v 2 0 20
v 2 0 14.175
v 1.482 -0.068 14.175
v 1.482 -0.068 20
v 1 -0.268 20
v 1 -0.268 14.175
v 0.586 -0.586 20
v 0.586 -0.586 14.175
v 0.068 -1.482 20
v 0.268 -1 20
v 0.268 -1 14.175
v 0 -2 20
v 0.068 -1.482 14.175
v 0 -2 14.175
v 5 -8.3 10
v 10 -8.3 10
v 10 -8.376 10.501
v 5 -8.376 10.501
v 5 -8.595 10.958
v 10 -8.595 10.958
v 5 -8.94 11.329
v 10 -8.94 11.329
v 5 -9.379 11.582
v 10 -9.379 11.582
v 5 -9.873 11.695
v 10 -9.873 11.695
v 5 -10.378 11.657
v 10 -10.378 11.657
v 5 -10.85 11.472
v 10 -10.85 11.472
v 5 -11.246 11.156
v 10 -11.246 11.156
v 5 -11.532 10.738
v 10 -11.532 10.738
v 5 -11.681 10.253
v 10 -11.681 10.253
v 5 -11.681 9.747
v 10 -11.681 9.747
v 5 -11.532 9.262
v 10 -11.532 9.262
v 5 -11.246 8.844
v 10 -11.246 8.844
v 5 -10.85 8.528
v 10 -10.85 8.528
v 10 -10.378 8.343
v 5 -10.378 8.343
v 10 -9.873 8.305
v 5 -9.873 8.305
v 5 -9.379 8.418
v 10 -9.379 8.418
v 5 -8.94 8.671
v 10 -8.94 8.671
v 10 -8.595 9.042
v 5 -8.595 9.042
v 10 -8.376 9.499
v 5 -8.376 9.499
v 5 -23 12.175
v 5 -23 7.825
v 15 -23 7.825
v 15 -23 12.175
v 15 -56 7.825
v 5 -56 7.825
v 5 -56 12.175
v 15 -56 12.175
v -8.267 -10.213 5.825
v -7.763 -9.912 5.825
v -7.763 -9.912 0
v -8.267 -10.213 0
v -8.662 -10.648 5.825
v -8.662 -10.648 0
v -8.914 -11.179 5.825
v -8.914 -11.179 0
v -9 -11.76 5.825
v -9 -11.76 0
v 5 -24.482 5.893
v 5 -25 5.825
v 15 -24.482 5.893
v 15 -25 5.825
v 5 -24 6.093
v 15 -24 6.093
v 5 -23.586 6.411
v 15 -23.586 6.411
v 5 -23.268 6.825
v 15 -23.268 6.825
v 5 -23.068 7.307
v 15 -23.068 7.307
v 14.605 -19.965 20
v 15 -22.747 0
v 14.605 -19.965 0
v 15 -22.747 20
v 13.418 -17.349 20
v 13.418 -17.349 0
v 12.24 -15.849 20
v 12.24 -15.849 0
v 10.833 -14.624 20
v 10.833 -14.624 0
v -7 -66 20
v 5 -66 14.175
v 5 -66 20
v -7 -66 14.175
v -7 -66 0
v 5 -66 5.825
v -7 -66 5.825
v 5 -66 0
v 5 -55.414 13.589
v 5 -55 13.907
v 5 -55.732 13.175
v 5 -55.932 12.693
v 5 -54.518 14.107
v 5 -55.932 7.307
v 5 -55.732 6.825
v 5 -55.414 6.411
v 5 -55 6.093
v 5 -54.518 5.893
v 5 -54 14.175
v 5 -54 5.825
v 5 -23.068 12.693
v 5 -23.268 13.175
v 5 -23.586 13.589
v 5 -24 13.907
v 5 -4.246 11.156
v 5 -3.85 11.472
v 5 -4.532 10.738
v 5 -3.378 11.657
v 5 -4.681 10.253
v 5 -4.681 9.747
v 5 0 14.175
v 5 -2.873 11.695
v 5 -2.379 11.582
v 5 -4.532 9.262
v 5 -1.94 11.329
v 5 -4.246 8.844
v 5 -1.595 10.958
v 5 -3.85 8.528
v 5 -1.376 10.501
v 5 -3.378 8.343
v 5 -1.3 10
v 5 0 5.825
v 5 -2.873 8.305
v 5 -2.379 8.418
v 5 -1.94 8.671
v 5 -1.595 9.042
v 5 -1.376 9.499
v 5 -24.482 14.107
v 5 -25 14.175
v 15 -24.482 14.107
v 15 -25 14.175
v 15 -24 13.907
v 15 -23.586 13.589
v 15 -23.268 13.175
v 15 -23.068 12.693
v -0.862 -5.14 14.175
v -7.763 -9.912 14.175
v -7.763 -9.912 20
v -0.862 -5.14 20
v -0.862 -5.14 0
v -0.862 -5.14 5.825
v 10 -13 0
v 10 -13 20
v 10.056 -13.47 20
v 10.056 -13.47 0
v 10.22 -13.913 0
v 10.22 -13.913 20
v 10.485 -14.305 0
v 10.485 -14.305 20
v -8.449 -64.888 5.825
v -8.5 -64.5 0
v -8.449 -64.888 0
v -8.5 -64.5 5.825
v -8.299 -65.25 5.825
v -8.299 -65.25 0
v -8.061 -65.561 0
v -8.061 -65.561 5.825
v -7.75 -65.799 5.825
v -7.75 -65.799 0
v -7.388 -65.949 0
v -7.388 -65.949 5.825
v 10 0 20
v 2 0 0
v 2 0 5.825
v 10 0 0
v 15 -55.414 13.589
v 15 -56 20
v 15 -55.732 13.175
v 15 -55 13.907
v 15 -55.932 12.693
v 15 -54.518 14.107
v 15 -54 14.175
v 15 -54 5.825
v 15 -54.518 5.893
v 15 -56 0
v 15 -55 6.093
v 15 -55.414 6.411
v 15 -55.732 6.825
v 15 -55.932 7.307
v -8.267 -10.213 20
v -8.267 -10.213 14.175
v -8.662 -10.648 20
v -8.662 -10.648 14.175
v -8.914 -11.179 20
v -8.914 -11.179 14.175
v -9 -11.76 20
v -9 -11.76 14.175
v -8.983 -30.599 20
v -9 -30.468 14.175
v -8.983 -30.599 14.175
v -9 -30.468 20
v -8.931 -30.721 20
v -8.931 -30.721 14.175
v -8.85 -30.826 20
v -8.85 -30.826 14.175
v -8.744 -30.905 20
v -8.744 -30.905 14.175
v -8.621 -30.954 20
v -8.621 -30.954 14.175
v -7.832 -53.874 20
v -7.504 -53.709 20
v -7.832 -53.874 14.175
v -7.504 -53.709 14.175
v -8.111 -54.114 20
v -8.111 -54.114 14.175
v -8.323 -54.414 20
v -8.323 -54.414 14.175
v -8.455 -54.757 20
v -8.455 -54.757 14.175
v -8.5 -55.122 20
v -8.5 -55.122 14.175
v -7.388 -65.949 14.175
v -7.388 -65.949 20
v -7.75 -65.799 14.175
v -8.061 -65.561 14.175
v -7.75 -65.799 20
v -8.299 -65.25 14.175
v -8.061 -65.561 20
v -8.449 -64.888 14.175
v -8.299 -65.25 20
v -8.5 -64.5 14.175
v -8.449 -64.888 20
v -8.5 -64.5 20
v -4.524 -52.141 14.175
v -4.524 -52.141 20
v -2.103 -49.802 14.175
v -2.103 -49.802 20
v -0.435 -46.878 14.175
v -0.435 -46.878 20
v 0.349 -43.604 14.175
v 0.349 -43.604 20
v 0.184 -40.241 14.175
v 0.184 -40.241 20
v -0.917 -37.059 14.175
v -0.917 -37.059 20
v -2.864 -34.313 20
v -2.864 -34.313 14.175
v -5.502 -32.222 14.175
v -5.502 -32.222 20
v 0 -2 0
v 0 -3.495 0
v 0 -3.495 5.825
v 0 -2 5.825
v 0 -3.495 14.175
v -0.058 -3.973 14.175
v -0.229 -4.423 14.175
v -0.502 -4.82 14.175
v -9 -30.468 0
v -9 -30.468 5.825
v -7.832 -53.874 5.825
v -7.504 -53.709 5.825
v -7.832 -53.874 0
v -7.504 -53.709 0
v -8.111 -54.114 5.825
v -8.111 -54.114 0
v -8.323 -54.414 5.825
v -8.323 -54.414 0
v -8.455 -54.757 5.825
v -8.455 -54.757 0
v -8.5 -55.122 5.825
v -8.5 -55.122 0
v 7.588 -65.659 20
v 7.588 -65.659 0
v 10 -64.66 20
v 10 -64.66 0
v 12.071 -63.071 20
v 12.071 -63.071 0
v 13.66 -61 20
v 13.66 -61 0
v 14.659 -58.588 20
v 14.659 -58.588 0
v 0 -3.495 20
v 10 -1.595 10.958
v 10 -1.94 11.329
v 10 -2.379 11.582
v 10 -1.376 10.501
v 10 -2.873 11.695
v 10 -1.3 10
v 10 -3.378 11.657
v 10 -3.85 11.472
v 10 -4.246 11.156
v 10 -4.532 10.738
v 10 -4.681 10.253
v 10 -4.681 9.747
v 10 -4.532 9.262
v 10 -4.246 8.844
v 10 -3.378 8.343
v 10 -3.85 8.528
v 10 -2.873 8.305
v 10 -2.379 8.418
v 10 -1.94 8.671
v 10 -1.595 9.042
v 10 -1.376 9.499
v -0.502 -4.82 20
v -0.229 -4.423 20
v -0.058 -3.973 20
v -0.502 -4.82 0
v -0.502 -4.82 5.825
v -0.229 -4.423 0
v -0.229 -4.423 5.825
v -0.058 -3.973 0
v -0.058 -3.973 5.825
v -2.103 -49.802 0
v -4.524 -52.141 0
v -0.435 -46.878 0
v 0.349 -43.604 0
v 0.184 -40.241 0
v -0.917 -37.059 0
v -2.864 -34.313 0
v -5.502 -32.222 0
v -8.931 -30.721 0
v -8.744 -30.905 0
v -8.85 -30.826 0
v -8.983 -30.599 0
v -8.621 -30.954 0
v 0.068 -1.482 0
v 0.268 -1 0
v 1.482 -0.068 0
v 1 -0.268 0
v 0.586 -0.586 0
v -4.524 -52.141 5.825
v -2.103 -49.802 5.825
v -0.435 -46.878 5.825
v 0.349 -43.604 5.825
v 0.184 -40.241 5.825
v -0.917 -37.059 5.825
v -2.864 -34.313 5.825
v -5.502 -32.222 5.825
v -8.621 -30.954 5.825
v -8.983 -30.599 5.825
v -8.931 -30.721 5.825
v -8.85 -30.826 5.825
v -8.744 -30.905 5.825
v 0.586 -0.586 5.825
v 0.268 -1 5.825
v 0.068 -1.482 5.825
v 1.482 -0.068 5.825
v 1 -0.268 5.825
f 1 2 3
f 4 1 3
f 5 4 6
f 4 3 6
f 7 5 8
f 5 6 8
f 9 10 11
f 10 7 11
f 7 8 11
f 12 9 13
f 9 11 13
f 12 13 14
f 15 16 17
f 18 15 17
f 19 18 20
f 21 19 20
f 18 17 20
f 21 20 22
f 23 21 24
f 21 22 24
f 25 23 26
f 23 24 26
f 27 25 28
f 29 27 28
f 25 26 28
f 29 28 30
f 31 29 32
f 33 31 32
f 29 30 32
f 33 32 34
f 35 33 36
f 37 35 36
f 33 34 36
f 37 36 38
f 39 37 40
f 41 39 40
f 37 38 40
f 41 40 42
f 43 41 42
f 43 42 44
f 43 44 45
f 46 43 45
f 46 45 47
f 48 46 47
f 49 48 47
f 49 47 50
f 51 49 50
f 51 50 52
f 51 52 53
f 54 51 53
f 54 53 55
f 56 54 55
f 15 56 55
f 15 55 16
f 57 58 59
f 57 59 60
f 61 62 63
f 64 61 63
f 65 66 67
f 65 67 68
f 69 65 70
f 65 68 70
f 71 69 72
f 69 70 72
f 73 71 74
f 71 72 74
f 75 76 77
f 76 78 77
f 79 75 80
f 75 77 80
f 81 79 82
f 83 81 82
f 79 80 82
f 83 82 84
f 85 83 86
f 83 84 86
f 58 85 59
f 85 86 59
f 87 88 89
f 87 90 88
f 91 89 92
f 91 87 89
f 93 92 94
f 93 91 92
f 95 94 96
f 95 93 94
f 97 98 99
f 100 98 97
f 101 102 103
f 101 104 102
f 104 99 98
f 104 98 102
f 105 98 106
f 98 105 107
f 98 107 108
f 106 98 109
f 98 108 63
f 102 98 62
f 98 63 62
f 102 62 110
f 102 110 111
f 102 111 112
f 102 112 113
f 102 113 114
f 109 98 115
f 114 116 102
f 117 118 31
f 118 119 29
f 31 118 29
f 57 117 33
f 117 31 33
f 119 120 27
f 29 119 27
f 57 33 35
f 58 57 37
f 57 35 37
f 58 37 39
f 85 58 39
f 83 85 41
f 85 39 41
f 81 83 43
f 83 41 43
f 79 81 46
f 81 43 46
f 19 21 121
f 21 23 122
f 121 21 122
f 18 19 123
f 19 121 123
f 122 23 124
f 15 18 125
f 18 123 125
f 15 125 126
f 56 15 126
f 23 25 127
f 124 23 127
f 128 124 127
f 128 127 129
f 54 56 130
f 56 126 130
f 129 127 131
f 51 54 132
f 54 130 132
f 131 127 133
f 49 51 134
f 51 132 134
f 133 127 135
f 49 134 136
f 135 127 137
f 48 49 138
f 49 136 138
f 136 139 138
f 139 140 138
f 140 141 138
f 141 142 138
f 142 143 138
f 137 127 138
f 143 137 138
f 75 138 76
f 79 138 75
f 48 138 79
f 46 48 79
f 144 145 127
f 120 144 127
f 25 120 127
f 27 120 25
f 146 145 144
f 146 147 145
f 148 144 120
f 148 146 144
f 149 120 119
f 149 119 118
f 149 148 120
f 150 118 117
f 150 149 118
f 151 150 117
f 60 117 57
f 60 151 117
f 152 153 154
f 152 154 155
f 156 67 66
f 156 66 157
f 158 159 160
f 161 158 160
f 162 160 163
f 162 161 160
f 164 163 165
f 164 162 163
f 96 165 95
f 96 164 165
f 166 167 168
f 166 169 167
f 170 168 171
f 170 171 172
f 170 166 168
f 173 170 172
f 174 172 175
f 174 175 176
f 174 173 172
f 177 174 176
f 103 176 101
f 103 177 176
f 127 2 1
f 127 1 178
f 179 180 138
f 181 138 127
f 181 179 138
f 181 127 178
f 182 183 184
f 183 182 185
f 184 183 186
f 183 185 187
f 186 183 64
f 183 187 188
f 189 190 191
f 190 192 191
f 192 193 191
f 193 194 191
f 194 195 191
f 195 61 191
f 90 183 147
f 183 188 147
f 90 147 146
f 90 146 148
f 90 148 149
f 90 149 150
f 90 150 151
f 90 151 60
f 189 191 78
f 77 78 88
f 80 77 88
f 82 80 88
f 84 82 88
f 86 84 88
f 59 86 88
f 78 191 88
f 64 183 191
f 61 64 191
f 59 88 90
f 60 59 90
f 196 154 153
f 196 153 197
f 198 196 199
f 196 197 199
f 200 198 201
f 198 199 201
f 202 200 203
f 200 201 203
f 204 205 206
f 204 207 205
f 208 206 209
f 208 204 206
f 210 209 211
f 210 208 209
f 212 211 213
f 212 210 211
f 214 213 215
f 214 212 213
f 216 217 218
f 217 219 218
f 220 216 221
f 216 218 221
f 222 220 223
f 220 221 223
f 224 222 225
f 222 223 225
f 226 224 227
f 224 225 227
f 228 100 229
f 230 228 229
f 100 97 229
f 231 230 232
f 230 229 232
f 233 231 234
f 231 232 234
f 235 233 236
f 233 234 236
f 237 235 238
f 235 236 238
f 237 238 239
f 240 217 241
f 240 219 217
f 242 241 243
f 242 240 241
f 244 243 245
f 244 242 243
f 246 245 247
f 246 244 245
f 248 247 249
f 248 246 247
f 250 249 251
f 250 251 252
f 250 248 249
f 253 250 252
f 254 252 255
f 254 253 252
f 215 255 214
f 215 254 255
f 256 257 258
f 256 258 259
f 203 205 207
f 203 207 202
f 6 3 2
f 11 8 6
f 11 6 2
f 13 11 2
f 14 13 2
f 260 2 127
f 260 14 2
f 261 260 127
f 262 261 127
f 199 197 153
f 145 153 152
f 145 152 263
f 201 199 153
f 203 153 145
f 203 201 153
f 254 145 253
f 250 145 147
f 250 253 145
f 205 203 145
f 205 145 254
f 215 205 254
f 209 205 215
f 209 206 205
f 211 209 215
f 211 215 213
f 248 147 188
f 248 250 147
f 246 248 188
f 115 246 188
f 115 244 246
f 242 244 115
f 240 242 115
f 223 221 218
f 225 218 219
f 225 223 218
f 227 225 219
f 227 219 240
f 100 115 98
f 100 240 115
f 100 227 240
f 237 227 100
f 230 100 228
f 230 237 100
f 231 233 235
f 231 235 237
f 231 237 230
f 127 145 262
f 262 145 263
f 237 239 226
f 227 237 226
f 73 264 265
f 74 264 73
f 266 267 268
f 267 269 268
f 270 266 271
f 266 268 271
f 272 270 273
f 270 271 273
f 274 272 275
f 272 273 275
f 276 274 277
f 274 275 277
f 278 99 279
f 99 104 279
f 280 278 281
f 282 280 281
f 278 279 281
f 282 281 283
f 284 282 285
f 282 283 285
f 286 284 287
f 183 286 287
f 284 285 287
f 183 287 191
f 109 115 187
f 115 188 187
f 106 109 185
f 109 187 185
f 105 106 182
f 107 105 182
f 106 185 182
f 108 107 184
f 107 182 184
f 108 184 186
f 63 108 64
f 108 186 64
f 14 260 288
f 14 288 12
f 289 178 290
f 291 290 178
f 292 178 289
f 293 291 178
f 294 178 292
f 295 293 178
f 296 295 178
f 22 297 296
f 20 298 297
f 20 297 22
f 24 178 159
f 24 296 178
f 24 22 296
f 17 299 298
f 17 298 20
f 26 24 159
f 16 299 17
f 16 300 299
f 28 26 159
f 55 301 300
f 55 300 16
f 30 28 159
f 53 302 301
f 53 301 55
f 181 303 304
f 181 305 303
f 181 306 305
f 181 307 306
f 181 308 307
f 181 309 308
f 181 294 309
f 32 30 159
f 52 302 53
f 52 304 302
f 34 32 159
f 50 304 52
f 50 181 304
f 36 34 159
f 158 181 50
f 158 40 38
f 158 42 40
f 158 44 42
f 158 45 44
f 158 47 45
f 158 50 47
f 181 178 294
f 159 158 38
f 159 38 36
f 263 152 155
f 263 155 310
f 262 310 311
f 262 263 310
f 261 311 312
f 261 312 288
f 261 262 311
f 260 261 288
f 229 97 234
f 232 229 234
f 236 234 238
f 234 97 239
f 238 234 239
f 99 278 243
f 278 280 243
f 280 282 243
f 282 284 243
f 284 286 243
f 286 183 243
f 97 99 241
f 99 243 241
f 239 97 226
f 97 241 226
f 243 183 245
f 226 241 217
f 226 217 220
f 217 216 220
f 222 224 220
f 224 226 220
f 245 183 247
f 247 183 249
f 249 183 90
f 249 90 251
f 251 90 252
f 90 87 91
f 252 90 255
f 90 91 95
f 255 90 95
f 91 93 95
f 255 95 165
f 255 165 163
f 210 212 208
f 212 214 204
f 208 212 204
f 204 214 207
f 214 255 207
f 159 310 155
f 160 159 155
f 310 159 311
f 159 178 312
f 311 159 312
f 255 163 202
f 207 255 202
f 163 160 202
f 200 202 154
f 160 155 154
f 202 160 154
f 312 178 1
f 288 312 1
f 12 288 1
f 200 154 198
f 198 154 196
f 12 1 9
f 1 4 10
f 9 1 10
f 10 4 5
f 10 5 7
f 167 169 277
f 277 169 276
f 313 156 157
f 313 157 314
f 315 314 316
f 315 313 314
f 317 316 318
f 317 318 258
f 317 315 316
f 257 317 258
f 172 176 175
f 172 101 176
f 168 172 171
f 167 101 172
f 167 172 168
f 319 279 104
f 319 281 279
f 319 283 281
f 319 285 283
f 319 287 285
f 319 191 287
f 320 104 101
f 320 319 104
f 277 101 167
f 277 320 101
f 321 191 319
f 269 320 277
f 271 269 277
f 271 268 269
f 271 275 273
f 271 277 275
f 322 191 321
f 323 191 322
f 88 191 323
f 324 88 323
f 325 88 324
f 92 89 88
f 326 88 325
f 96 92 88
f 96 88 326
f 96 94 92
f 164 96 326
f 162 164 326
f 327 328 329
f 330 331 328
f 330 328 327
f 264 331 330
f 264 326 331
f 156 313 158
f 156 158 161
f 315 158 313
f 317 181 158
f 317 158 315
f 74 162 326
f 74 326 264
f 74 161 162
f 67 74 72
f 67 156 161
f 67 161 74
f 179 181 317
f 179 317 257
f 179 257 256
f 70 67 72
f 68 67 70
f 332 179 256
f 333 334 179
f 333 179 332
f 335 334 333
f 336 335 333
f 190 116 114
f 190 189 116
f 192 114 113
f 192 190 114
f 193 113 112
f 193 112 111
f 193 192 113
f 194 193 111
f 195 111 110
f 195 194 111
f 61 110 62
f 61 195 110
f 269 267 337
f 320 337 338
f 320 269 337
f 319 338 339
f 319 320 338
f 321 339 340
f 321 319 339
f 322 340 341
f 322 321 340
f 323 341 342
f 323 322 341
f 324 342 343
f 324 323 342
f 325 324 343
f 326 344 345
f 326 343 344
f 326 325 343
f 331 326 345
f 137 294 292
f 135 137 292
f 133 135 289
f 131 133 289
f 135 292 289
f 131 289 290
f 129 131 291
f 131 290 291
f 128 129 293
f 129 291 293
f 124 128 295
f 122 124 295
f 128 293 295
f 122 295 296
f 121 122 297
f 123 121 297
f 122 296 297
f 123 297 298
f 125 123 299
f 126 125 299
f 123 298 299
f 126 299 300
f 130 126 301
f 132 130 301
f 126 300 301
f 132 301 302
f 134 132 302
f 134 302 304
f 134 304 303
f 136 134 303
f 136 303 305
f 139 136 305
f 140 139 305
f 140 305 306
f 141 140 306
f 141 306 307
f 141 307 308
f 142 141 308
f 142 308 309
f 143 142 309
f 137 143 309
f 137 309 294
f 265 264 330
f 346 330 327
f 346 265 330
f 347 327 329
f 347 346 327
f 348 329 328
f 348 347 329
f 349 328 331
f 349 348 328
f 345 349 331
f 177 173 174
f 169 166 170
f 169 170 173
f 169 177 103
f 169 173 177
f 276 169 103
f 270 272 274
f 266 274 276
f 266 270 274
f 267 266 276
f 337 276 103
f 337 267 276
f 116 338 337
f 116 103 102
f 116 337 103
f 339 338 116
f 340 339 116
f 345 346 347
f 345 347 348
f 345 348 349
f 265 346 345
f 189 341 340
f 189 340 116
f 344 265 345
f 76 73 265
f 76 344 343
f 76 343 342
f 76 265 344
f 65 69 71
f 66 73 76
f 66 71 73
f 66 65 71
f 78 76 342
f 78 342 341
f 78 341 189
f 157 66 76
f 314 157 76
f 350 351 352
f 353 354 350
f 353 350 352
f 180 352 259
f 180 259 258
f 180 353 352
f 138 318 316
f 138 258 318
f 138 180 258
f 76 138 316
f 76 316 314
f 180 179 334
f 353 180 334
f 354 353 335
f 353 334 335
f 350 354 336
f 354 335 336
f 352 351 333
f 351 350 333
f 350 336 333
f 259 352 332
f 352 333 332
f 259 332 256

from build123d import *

# Parameters (mm, degrees)
SKETCH_1_R          = 1.7
EXTRUDE_1_DEPTH     = 20
SKETCH_2_W          = 31.643510299
SKETCH_2_H          = 8.35
CUT_EXTRUDE_1_DEPTH = 75.850374033
SKETCH_4_R          = 1.7
CUT_EXTRUDE_3_DEPTH = 73.237455658
FILLET_1_R          = 0.5
FILLET_2_R          = 2
SKETCH_5_W          = 3.571488154
SKETCH_5_H          = 19.286036032
CUT_EXTRUDE_4_DEPTH = 75.850374033
FILLET_3_R          = 1.5
SKETCH_6_W          = 14.583576629
SKETCH_6_H          = 57.679533687
CUT_EXTRUDE_5_DEPTH = 75.850374033
FILLET_4_R          = 10
SKETCH_7_W          = 8.35
SKETCH_7_H          = 33
CUT_EXTRUDE_6_DEPTH = 71.370448485
FILLET_5_R          = 2


# Some blends are built 0.0001 mm under size
with BuildPart() as part:
    # 草图1 → 凸台-拉伸1 (new body)
    with BuildSketch(Plane.XY):
        with BuildLine():
            Line((0, 0), (10, 0))
            Line((10, 0), (10, -15))
            Line((10, -15), (29.096021943, -15))
            Line((29.096021943, -15), (29.096021943, -66))
            Line((29.096021943, -66), (-11.5, -66))
            Line((-11.5, -66), (-11.5, -54.4))
            ThreePointArc((-11.5, -54.4), (0.333421668, -43.75703287), (-9, -30.865568342))
            Line((-9, -30.865568342), (-9, -9.911704997))
            Line((-9, -9.911704997), (-7.763036189, -9.911704997))
            Line((-7.763036189, -9.911704997), (0, -4.543101007))
            Line((0, -4.543101007), (0, 0))
        make_face()
        with Locations((19.5, -30.6)):
            Circle(SKETCH_1_R, mode=Mode.SUBTRACT)
        with Locations((19.5, -56)):
            Circle(SKETCH_1_R, mode=Mode.SUBTRACT)
    extrude(amount=EXTRUDE_1_DEPTH)

    # 草图2 → 切除-拉伸1 (cut, through all)
    with BuildSketch(Plane(origin=(0, 0, 0), x_dir=(1, 0, 0), z_dir=(0, 1, 0))):
        with Locations((-10.82175515, -10)):
            Rectangle(SKETCH_2_W, SKETCH_2_H)
    extrude(amount=-CUT_EXTRUDE_1_DEPTH, mode=Mode.SUBTRACT)

    # 草图4 → 切除-拉伸3 (cut, through all)
    with BuildSketch(Plane(origin=(10, 0, 0), x_dir=(0, 0, -1), z_dir=(1, 0, 0))):
        with Locations(Location((-10, -3, 0), (0, 0, 90))):
            Circle(SKETCH_4_R)
        with Locations(Location((-10, -10, 0), (0, 0, 90))):
            Circle(SKETCH_4_R)
    extrude(amount=-CUT_EXTRUDE_3_DEPTH, mode=Mode.SUBTRACT)

    # 圆角1
    fillet_1_edges = [part.edges().sort_by_distance(p)[0] for p in [
        (-11.5, -66, 17.0875),
        (-9, -30.865568342, 17.0875),
        (-11.5, -66, 2.9125),
        (-9, -30.865568342, 2.9125),
    ]]
    fillet(fillet_1_edges, radius=FILLET_1_R)

    # 圆角2
    # the kernel refuses this fillet: 2 mm, written as the material it adds along each edge
    with BuildSketch(Plane(origin=(0, -4.543101007, 14.175), x_dir=(0, 1, 0), z_dir=(0, 0, 1)), Plane(origin=(0, -4.543101007, 0), x_dir=(0, 1, 0), z_dir=(0, 0, 1))) as fillet_2_piece_1:
        with BuildLine():
            CenterArc((FILLET_2_R * 0.524275273185, FILLET_2_R), FILLET_2_R, 214.666177241, 55.333822759)
            Line((-FILLET_2_R * 0.298204680815, FILLET_2_R * 0.431205902572), (0, 0))
            Line((0, 0), (FILLET_2_R * 0.524275273185, 0))
        make_face()
    extrude(amount=5.825)
    with BuildSketch(Plane(origin=(10, -15, 0), x_dir=(1, 0, 0), z_dir=(0, 0, 1))) as fillet_2_piece_2:
        with BuildLine():
            CenterArc((FILLET_2_R, FILLET_2_R), FILLET_2_R, 180, 90)
            Line((0, FILLET_2_R), (0, 0))
            Line((0, 0), (FILLET_2_R, 0))
        make_face()
    extrude(amount=20)
    # the kernel refuses this fillet: 2 mm, written as the material it takes off along each edge
    with BuildSketch(Plane(origin=(-9, -9.911704997, -4.621806853), x_dir=(0, -1, 0), z_dir=(0, 0, 1)), Plane(origin=(-9, -9.911704997, 9.553193147), x_dir=(0, -1, 0), z_dir=(0, 0, 1))) as fillet_2_2_piece_1:
        with BuildLine():
            CenterArc((1.848722741, 2), FILLET_2_R, 202.427748684, 67.572251316)
            Line((0, 1.236963811), (0, 0))
            Line((0, 0), (1.848722741, 0))
        make_face()
    extrude(amount=15.068613706, mode=Mode.SUBTRACT)
    with BuildSketch(Plane(origin=(0, 0, -5), x_dir=(1, 0, 0), z_dir=(0, 0, 1)), Plane(origin=(0, 0, 9.175), x_dir=(1, 0, 0), z_dir=(0, 0, 1))) as fillet_2_2_piece_2:
        with BuildLine():
            CenterArc((FILLET_2_R, -FILLET_2_R), FILLET_2_R, 90, 90)
            Line((0, -FILLET_2_R), (0, 0))
            Line((0, 0), (FILLET_2_R, 0))
        make_face()
    extrude(amount=15.825, mode=Mode.SUBTRACT)
    with BuildSketch(Plane(origin=(29.096021943, -15, -5), x_dir=(0, -1, 0), z_dir=(0, 0, 1)), Plane(origin=(29.096021943, -66, -5), x_dir=(-1, 0, 0), z_dir=(0, 0, 1))) as fillet_2_2_piece_3:
        with BuildLine():
            CenterArc((FILLET_2_R, -FILLET_2_R), FILLET_2_R, 90, 90)
            Line((0, -FILLET_2_R), (0, 0))
            Line((0, 0), (FILLET_2_R, 0))
        make_face()
    extrude(amount=30, mode=Mode.SUBTRACT)

    # 草图5 → 切除-拉伸4 (cut, through all)
    with BuildSketch(Plane.XY.offset(20)):
        with Locations((-10.285744077, -57.827803492)):
            Rectangle(SKETCH_5_W, SKETCH_5_H)
    extrude(amount=-CUT_EXTRUDE_4_DEPTH, mode=Mode.SUBTRACT)

    # 圆角3
    fillet_3_edges = [part.edges().sort_by_distance(p)[0] for p in [
        (-8.5, -54.015641537, 2.9125),
        (-8.5, -66, 2.9125),
        (-8.5, -54.015641537, 17.0875),
        (-8.5, -66, 17.0875),
    ]]
    fillet(fillet_3_edges, radius=FILLET_3_R)

    # 草图6 → 切除-拉伸5 (cut, through all)
    with BuildSketch(Plane(origin=(0, 0, 0), x_dir=(-1, 0, 0), z_dir=(0, 0, -1))):
        with Locations((-22.291788315, -40.000125123)):
            Rectangle(SKETCH_6_W, SKETCH_6_H)
    extrude(amount=-CUT_EXTRUDE_5_DEPTH, mode=Mode.SUBTRACT)

    # 圆角4
    fillet_4_edges = [part.edges().sort_by_distance(p)[0] for p in [
        (15, -66, 10),
        (15, -15, 10),
    ]]
    fillet(fillet_4_edges, radius=FILLET_4_R - 0.0001)  # a hair under: the kernel refuses the full size

    # 草图7 → 切除-拉伸6 (cut, through all)
    with BuildSketch(Plane.ZY.offset(-5)):
        with Locations((10, -39.5)):
            Rectangle(SKETCH_7_W, SKETCH_7_H)
    extrude(amount=-CUT_EXTRUDE_6_DEPTH, mode=Mode.SUBTRACT)

    # 圆角5
    fillet_5_edges = [part.edges().sort_by_distance(p)[0] for p in [
        (10, -56, 5.825),
        (10, -23, 5.825),
        (10, -23, 14.175),
        (10, -56, 14.175),
    ]]
    fillet(fillet_5_edges, radius=FILLET_5_R)


solid = part.part
